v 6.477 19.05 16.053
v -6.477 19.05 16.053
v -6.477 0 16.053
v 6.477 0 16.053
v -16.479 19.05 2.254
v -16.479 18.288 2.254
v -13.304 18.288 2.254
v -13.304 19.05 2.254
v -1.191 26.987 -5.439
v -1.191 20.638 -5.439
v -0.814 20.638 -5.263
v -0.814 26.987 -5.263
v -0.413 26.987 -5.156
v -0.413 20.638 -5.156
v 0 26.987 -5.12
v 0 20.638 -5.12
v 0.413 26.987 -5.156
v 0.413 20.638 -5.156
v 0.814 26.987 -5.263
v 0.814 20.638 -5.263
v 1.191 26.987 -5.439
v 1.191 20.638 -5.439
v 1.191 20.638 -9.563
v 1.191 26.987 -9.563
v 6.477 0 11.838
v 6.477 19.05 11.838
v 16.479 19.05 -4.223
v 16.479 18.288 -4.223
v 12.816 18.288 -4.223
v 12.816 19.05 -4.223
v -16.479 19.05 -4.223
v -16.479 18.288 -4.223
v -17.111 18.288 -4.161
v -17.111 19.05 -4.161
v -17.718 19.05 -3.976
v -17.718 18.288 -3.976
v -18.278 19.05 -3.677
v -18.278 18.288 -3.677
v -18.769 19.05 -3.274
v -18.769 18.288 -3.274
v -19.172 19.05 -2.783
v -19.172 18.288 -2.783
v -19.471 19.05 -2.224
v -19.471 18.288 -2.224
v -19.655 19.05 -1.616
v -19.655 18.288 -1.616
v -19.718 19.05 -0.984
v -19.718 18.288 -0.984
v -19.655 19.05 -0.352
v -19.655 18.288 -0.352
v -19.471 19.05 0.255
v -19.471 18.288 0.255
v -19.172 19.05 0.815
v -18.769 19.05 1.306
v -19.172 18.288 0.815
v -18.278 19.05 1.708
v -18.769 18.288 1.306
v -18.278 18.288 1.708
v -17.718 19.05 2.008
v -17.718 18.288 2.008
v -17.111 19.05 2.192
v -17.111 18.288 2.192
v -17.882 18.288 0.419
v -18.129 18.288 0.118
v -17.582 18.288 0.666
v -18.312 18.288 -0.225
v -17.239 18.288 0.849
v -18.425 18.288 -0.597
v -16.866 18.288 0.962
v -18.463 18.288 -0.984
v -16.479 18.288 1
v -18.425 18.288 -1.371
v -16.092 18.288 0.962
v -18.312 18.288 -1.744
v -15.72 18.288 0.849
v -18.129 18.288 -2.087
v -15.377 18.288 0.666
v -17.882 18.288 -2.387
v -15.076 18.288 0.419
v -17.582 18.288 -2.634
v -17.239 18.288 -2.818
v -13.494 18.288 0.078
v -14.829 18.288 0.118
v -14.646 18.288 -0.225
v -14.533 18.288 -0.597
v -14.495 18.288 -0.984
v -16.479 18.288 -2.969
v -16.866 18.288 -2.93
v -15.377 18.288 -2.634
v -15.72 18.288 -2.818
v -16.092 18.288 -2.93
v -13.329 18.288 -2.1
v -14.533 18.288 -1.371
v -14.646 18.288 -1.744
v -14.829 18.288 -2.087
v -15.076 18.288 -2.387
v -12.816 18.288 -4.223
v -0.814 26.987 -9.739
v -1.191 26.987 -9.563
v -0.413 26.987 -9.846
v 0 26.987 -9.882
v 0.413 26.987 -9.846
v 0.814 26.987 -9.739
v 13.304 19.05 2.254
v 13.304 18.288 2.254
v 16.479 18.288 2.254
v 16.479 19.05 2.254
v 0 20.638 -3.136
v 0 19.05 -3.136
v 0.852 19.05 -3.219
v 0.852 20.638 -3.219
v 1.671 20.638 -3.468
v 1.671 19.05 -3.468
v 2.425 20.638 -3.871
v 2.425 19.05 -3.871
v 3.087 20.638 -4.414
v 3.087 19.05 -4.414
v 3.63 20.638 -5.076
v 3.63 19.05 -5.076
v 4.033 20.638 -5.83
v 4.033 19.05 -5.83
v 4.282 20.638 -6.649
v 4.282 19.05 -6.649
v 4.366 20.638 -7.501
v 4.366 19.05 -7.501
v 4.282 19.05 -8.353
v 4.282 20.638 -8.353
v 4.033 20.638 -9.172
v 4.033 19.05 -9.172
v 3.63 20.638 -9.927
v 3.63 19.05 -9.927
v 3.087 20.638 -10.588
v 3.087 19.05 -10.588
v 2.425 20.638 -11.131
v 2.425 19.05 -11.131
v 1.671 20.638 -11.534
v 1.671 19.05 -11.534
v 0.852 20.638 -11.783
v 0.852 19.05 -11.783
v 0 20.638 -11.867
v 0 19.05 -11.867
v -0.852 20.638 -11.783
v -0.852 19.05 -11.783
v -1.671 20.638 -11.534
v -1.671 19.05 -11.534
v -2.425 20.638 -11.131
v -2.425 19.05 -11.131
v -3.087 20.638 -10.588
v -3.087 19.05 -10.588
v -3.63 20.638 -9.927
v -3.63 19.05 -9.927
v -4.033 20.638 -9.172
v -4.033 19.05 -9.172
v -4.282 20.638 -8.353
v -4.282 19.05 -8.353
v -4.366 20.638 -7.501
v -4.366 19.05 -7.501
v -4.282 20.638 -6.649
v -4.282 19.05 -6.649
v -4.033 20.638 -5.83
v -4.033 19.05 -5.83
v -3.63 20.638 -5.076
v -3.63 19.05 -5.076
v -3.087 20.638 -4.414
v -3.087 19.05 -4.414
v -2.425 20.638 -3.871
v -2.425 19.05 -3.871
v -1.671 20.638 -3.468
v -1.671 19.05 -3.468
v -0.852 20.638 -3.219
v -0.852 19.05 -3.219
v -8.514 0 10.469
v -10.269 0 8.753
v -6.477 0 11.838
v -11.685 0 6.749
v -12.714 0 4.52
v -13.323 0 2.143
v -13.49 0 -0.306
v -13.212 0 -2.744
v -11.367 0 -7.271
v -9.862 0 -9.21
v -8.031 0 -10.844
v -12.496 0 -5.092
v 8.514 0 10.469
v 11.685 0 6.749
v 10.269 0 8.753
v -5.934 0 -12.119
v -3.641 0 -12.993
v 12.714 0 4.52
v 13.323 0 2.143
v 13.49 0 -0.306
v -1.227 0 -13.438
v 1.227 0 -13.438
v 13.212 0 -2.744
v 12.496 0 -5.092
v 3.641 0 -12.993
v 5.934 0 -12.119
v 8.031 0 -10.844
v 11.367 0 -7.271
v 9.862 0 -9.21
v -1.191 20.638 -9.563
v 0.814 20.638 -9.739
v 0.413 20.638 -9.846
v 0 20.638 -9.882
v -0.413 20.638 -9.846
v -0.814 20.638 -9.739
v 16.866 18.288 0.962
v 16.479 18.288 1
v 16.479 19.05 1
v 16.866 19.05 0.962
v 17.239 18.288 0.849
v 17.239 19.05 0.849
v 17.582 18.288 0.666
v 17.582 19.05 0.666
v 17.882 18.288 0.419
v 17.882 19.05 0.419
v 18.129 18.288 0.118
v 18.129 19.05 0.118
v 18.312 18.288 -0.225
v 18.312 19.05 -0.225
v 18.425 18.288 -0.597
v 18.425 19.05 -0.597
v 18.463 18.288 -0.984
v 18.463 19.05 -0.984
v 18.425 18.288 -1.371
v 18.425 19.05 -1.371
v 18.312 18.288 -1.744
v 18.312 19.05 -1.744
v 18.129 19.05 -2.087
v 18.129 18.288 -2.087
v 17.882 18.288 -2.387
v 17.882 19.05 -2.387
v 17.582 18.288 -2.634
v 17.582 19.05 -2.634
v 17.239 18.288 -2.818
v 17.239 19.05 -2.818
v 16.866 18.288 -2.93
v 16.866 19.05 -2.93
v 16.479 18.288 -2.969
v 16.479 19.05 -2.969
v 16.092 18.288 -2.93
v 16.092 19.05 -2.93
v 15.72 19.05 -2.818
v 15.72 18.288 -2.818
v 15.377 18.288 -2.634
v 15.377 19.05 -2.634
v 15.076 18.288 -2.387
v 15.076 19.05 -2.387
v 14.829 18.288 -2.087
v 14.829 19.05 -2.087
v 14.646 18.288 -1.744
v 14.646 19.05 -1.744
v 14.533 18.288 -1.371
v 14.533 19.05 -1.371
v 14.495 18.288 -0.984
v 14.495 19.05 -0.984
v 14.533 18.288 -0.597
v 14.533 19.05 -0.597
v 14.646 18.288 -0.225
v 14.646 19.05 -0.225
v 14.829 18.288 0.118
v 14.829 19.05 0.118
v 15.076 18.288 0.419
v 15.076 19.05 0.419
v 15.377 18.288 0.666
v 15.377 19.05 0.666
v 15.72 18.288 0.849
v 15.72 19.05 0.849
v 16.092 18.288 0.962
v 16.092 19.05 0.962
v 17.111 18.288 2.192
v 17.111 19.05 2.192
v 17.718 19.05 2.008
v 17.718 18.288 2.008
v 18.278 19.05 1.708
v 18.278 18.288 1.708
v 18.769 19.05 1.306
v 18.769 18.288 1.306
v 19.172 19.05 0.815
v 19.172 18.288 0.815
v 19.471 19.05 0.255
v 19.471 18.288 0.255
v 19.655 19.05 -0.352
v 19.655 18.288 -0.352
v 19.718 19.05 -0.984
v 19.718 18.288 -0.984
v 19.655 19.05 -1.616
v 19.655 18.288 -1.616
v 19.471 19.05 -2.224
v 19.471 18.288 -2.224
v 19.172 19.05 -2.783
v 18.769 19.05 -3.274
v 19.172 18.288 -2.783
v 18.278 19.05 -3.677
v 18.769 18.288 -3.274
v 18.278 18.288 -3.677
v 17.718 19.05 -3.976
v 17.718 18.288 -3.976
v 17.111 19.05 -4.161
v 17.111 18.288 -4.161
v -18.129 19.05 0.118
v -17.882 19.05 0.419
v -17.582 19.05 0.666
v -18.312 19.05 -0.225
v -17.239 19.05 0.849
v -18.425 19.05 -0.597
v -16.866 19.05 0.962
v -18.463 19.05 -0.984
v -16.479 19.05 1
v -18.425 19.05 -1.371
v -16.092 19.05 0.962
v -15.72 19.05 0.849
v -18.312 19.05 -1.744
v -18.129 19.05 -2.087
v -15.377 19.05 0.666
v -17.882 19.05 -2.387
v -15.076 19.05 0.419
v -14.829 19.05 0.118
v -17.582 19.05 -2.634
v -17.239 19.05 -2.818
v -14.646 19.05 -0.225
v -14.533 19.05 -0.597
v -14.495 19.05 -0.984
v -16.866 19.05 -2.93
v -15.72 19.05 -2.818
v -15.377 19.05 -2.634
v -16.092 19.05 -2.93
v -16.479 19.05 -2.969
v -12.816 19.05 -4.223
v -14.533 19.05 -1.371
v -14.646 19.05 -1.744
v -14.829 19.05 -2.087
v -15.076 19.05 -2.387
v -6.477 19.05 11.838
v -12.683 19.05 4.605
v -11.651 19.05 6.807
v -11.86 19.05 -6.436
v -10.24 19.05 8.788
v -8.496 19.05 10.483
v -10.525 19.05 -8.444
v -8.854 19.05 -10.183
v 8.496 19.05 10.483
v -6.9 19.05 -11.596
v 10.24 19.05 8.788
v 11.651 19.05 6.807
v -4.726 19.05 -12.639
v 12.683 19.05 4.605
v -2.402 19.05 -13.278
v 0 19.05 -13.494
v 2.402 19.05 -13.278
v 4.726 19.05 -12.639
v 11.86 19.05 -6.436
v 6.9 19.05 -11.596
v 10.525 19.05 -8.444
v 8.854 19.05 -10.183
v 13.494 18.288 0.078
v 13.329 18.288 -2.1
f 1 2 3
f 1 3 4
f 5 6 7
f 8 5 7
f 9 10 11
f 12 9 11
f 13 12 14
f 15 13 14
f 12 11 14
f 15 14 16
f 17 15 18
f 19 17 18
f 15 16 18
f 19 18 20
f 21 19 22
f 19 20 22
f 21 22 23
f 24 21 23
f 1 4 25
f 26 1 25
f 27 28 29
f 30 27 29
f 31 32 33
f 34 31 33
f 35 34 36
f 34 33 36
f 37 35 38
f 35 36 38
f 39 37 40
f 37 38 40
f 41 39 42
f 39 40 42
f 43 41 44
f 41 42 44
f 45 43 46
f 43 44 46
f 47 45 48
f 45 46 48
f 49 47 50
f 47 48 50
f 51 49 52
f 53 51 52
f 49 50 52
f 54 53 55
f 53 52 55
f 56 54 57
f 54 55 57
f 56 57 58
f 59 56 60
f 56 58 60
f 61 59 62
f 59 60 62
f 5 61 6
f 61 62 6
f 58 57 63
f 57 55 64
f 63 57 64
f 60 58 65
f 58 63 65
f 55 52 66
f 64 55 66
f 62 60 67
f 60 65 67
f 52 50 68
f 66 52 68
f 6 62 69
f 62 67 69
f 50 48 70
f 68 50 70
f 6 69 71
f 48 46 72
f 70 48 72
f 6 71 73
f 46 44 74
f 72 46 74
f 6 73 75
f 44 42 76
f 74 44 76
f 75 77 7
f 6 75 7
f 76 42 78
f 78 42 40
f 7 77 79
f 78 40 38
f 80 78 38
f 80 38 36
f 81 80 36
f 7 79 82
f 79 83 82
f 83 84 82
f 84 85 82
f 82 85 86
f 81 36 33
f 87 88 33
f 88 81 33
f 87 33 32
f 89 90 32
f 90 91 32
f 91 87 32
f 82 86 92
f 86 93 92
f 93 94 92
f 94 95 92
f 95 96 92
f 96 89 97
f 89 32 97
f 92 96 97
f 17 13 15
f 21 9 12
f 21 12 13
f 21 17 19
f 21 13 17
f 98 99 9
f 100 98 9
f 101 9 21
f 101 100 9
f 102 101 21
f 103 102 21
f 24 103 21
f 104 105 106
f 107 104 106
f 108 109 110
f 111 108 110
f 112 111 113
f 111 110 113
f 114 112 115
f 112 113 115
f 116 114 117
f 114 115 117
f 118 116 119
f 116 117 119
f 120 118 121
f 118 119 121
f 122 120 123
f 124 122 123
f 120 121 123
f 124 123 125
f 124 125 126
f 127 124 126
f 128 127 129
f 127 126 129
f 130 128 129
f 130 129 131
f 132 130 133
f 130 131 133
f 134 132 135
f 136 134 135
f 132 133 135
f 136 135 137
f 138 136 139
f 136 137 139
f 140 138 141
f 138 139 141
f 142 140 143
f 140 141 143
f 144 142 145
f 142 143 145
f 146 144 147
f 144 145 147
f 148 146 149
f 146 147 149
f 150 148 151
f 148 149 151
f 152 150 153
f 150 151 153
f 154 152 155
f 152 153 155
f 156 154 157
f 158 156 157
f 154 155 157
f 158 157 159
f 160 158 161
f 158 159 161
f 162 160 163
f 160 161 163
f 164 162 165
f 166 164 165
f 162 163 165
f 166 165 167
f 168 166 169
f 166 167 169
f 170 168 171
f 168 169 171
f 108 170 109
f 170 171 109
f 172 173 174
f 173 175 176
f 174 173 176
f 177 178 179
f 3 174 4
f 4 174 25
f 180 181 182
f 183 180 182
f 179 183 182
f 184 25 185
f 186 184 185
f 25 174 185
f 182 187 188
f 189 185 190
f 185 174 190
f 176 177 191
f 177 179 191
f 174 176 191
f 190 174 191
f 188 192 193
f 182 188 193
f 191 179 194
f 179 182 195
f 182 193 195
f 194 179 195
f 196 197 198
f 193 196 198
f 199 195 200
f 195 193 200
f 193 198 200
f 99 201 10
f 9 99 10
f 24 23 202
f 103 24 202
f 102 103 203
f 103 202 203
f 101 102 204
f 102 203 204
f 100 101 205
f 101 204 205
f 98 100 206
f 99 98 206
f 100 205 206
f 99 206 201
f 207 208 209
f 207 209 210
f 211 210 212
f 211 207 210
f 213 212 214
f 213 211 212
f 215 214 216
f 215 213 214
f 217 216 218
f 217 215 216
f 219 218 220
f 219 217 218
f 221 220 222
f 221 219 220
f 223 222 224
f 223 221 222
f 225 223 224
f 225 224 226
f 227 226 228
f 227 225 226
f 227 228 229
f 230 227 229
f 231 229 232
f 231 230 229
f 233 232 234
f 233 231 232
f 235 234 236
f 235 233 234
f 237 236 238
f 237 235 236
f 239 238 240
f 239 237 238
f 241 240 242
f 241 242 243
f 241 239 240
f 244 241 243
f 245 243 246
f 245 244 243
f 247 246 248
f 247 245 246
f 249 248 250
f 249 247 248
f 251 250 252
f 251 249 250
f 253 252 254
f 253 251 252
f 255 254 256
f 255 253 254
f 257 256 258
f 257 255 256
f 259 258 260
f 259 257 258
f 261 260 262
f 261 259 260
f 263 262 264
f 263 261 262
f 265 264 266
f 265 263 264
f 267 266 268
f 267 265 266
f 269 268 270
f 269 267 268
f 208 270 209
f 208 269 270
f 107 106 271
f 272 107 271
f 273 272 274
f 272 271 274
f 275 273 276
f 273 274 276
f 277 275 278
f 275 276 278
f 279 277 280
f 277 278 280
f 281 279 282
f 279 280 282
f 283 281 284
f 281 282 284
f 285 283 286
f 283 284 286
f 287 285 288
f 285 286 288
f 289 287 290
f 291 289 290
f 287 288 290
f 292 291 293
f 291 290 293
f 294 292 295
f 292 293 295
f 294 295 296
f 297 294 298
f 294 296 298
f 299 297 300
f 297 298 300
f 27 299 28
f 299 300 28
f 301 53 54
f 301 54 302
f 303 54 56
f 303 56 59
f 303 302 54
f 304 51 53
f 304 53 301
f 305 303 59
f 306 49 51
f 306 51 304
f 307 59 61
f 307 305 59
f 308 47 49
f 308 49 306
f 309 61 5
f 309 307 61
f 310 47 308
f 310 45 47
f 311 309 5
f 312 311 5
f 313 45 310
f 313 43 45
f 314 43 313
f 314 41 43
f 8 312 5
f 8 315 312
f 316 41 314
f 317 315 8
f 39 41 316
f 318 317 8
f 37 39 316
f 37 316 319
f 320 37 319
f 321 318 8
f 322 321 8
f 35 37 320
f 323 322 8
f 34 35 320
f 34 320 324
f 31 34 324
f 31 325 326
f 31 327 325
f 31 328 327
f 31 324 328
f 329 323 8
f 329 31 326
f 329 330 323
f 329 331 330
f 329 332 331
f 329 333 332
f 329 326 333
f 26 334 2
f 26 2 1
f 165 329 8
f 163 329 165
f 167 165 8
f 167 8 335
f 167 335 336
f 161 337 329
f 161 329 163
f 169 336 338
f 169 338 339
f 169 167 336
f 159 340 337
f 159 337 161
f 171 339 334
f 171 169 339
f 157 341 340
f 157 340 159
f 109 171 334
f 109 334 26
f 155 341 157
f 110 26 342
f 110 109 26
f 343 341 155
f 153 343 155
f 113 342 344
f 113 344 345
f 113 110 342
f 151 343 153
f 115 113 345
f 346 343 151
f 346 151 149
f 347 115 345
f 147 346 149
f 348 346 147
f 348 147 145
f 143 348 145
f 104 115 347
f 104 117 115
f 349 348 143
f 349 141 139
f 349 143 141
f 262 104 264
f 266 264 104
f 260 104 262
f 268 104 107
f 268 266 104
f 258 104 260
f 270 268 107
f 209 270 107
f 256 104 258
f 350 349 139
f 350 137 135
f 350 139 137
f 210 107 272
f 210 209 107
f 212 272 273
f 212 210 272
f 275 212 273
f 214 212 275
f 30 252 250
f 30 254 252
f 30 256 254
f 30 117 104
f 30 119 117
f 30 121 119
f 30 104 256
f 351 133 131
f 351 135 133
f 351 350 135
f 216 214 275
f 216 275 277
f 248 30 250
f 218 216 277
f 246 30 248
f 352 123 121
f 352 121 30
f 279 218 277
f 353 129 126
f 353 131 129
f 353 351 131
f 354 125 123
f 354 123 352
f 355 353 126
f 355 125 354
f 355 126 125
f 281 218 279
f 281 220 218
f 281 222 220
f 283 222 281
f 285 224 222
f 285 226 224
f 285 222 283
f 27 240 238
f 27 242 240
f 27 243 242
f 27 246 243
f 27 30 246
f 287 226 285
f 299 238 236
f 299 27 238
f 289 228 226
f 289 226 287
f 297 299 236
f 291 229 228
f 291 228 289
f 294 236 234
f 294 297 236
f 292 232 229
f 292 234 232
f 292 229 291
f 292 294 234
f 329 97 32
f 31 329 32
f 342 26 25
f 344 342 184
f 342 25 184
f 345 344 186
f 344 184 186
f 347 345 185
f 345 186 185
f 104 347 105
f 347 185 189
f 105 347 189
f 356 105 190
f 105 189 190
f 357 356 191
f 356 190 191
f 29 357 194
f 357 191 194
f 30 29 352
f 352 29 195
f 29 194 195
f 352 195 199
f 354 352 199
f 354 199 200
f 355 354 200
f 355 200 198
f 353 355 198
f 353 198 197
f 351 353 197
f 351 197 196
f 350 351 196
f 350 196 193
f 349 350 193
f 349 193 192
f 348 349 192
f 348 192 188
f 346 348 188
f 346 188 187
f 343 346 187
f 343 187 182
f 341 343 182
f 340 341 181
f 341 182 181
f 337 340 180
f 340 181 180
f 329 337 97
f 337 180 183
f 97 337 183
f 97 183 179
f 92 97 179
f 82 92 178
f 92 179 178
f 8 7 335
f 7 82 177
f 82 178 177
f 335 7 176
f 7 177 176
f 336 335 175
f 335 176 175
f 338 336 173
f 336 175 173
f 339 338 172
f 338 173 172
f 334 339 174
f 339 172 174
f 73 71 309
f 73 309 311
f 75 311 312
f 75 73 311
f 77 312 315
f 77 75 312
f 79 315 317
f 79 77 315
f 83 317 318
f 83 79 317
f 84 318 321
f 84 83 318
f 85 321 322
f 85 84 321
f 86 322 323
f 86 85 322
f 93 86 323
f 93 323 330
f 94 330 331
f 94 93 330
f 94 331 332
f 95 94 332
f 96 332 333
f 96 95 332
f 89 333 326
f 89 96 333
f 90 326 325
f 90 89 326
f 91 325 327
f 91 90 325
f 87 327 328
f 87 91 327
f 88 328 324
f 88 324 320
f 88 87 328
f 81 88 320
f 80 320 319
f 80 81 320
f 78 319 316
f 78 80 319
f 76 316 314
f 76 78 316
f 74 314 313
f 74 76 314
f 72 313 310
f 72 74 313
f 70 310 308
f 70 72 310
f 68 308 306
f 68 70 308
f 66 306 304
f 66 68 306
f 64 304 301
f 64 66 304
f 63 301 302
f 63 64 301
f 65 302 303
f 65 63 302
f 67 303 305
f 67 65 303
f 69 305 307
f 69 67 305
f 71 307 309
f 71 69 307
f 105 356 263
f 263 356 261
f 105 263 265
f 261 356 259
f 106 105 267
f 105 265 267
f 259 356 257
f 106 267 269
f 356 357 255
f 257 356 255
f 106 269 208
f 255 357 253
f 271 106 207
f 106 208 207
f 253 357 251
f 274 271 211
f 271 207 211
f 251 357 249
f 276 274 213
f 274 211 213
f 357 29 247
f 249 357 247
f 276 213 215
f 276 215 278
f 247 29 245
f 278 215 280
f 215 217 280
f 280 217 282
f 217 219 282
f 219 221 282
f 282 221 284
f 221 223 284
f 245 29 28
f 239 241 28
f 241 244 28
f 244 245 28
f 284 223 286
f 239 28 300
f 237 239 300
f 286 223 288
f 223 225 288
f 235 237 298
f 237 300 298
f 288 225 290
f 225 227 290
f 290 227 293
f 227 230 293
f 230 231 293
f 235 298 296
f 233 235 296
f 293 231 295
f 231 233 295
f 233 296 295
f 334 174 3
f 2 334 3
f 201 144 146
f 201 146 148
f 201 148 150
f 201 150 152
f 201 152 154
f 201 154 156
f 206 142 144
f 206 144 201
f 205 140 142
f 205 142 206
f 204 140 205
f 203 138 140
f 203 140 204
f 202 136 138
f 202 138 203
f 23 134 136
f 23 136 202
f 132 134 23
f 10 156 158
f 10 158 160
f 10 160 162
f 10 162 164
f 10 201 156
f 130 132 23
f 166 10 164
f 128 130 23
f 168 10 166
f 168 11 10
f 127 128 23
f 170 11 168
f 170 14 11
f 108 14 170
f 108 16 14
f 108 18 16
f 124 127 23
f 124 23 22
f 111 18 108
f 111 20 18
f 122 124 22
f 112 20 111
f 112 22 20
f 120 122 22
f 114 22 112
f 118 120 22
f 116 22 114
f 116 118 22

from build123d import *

# Parameters (mm, degrees)
BOSS_EXTRUDE1_DEPTH = 19.05
BOSS_EXTRUDE2_START = -0.762
SKETCH3_R           = 1.984375
BOSS_EXTRUDE2_DEPTH = 0.762
SKETCH5_R           = 4.365625
BOSS_EXTRUDE3_DEPTH = 1.5875
BOSS_EXTRUDE4_DEPTH = 6.35


with BuildPart() as part:
    # Sketch2 → Boss-Extrude1 (new body)
    with BuildSketch(Plane(origin=(0, 0, 0), x_dir=(1, 0, 0), z_dir=(0, 1, 0))):
        with BuildLine():
            Line((6.477, -16.053488894), (6.477, -11.83764166))
            ThreePointArc((6.477, -11.83764166), (0, 13.49375), (-6.477, -11.83764166))
            Line((-6.477, -11.83764166), (-6.477, -16.053488894))
            Line((-6.477, -16.053488894), (6.477, -16.053488894))
        make_face()
    extrude(amount=BOSS_EXTRUDE1_DEPTH)

    # Sketch3 → Boss-Extrude2 (add)
    # profile 1 of 2: a face of its own
    with BuildSketch(Plane(origin=(0, 19.05, 0), x_dir=(1, 0, 0), z_dir=(0, 1, 0)).offset(BOSS_EXTRUDE2_START)):
        with BuildLine():
            ThreePointArc((-16.479121392, 4.22275), (-19.717621392, 0.98425), (-16.479121392, -2.25425))
            Line((-16.479121392, -2.25425), (-13.304121392, -2.25425))
            ThreePointArc((-13.304121392, -2.25425), (-13.455592652, 1.014058895), (-12.815992802, 4.22275))
            Line((-12.815992802, 4.22275), (-16.479121392, 4.22275))
        make_face()
        with Locations(Location((-16.479121392, 0.98425, 0), (0, 0, 270))):
            Circle(SKETCH3_R, mode=Mode.SUBTRACT)
    # profile 2 of 2: a face of its own
    with BuildSketch(Plane(origin=(0, 19.05, 0), x_dir=(1, 0, 0), z_dir=(0, 1, 0)).offset(BOSS_EXTRUDE2_START)):
        with BuildLine():
            Line((16.479121392, 4.22275), (12.815992802, 4.22275))
            ThreePointArc((12.815992802, 4.22275), (13.455592652, 1.014058895), (13.304121392, -2.25425))
            Line((13.304121392, -2.25425), (16.479121392, -2.25425))
            ThreePointArc((16.479121392, -2.25425), (19.717621392, 0.98425), (16.479121392, 4.22275))
        make_face()
        with Locations(Location((16.479121392, 0.98425, 0), (0, 0, 270))):
            Circle(SKETCH3_R, mode=Mode.SUBTRACT)
    extrude(amount=BOSS_EXTRUDE2_DEPTH)

    # Sketch5 → Boss-Extrude3 (add)
    with BuildSketch(Plane(origin=(0, 19.05, 0), x_dir=(1, 0, 0), z_dir=(0, 1, 0))):
        with Locations(Location((0, 7.501133667, 0), (0, 0, 270))):
            Circle(SKETCH5_R)
    extrude(amount=BOSS_EXTRUDE3_DEPTH)

    # Sketch6 → Boss-Extrude4 (add)
    with BuildSketch(Plane(origin=(0, 20.6375, 0), x_dir=(1, 0, 0), z_dir=(0, 1, 0))):
        with BuildLine():
            ThreePointArc((1.190625, 9.56335666), (0, 9.882383667), (-1.190625, 9.56335666))
            Line((-1.190625, 9.56335666), (-1.190625, 5.438910675))
            ThreePointArc((-1.190625, 5.438910675), (0, 5.119883667), (1.190625, 5.438910675))
            Line((1.190625, 5.438910675), (1.190625, 9.56335666))
        make_face()
    extrude(amount=BOSS_EXTRUDE4_DEPTH)


solid = part.part
